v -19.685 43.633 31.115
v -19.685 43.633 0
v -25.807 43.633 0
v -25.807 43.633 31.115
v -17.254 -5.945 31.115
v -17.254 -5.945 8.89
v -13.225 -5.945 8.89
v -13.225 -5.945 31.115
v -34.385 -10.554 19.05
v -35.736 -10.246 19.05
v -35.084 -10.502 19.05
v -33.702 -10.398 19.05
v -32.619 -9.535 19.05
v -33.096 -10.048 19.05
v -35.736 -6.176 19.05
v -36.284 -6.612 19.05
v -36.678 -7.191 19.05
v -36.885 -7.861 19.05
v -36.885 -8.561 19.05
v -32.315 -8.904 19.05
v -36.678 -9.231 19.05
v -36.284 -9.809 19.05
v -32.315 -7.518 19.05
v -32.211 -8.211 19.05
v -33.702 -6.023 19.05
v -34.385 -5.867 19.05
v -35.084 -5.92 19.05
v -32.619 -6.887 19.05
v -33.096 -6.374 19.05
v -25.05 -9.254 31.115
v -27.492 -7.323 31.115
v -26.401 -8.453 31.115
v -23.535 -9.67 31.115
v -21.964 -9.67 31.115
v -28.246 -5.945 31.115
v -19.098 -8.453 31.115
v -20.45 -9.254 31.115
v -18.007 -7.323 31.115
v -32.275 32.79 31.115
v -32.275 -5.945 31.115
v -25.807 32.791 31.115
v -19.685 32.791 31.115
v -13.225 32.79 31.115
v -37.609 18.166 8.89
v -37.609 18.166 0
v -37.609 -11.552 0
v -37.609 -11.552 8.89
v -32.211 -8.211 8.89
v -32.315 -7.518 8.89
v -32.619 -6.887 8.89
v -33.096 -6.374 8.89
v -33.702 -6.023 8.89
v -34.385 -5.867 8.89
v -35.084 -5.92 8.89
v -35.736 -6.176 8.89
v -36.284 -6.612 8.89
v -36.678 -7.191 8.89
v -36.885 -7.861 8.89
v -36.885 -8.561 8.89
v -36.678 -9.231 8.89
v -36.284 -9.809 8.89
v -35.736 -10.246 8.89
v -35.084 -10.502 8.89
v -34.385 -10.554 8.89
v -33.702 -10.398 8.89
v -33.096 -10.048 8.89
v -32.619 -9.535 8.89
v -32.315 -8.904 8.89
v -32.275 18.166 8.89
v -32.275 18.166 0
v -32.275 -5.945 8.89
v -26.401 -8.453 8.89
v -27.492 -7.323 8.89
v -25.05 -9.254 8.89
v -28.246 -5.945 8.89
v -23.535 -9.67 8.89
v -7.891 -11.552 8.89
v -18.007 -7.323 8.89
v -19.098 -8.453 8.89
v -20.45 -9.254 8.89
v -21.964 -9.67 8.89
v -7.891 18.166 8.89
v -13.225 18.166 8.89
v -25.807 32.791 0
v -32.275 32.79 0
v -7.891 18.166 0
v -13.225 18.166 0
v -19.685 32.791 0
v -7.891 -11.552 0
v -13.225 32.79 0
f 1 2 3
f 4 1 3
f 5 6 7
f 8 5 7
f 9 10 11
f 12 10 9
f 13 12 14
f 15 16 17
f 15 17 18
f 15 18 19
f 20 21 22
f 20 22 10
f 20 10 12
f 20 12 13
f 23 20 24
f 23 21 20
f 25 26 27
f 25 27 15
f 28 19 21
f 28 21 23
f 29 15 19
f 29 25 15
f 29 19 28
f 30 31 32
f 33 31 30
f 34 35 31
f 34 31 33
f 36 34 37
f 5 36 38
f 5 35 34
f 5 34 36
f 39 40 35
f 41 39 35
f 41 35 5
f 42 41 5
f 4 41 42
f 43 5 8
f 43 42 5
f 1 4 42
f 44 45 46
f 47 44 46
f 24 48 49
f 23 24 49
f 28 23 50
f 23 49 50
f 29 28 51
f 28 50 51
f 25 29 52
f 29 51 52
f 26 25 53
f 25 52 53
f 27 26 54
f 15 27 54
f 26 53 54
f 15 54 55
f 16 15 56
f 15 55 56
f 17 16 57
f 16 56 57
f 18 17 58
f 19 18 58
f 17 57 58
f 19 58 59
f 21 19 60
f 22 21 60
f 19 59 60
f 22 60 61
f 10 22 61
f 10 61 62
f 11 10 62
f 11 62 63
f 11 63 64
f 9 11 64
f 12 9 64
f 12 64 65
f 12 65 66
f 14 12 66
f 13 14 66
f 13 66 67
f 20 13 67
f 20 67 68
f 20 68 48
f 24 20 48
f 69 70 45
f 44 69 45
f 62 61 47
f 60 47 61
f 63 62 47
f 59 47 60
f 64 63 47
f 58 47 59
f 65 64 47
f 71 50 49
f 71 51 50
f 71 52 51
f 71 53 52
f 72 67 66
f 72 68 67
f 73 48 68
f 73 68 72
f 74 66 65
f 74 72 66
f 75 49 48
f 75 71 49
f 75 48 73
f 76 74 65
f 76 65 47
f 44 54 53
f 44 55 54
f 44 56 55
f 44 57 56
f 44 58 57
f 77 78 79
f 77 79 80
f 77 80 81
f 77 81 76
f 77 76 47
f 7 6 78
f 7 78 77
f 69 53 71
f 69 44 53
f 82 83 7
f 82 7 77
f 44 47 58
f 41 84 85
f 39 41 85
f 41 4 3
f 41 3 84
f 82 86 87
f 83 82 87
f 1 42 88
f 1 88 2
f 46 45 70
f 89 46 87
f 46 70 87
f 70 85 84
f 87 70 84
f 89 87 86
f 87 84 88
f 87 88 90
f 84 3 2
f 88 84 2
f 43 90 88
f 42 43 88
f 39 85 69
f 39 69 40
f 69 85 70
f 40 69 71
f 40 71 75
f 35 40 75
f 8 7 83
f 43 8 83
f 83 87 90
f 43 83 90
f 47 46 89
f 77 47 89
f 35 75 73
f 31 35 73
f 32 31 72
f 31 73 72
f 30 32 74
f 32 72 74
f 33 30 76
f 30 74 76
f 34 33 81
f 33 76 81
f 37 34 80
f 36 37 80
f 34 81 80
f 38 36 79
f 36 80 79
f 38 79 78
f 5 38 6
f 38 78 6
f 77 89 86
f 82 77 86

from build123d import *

# Parameters (mm, degrees)
F1_DEPTH = 31.115
F0_R     = 2.350014
F2_DEPTH = 8.89
F3_DEPTH = 19.05


with BuildPart() as f1:
    # F0 (on Top) → F1 (new body)
    with BuildSketch(Plane.XY):
        with BuildLine():
            Line((-32.274887, 32.790409), (-32.274887, 18.16624))
            Line((-32.274887, 18.16624), (-32.274887, -5.944591))
            Line((-32.274887, -5.944591), (-28.24577, -5.944591))
            ThreePointArc((-28.24577, -5.944591), (-22.749887, -9.722416), (-17.254004, -5.944591))
            Line((-17.254004, -5.944591), (-13.224887, -5.944591))
            Line((-13.224887, -5.944591), (-13.224887, 18.16624))
            Line((-13.224887, 18.16624), (-13.224887, 32.790409))
            Line((-13.224887, 32.790409), (-19.685246, 32.790929))
            Line((-19.685246, 32.790929), (-19.685246, 43.633332))
            Line((-19.685246, 43.633332), (-25.806736, 43.633332))
            Line((-25.806736, 43.633332), (-25.806736, 32.790929))
            Line((-25.806736, 32.790929), (-32.274887, 32.790409))
        make_face()
    extrude(amount=F1_DEPTH)

    # F0 (on Top) → F2 (join)
    with BuildSketch(Plane.XY):
        with BuildLine():
            Line((-37.608887, 18.16624), (-37.608887, -11.55176))
            Line((-37.608887, -11.55176), (-7.890887, -11.55176))
            Line((-7.890887, -11.55176), (-7.890887, 18.16624))
            Line((-7.890887, 18.16624), (-13.224887, 18.16624))
            Line((-13.224887, 18.16624), (-13.224887, -5.944591))
            Line((-13.224887, -5.944591), (-17.254004, -5.944591))
            ThreePointArc((-17.254004, -5.944591), (-22.749887, -9.722416), (-28.24577, -5.944591))
            Line((-28.24577, -5.944591), (-32.274887, -5.944591))
            Line((-32.274887, -5.944591), (-32.274887, 18.16624))
            Line((-32.274887, 18.16624), (-37.608887, 18.16624))
        make_face()
        with Locations((-34.560874, -8.21091)):
            Circle(F0_R, mode=Mode.SUBTRACT)
    extrude(amount=F2_DEPTH)

    # F0 (on Top) → F3 (join)
    with BuildSketch(Plane.XY):
        with Locations((-34.560874, -8.21091)):
            Circle(F0_R)
    extrude(amount=F3_DEPTH)


solid = f1.part
